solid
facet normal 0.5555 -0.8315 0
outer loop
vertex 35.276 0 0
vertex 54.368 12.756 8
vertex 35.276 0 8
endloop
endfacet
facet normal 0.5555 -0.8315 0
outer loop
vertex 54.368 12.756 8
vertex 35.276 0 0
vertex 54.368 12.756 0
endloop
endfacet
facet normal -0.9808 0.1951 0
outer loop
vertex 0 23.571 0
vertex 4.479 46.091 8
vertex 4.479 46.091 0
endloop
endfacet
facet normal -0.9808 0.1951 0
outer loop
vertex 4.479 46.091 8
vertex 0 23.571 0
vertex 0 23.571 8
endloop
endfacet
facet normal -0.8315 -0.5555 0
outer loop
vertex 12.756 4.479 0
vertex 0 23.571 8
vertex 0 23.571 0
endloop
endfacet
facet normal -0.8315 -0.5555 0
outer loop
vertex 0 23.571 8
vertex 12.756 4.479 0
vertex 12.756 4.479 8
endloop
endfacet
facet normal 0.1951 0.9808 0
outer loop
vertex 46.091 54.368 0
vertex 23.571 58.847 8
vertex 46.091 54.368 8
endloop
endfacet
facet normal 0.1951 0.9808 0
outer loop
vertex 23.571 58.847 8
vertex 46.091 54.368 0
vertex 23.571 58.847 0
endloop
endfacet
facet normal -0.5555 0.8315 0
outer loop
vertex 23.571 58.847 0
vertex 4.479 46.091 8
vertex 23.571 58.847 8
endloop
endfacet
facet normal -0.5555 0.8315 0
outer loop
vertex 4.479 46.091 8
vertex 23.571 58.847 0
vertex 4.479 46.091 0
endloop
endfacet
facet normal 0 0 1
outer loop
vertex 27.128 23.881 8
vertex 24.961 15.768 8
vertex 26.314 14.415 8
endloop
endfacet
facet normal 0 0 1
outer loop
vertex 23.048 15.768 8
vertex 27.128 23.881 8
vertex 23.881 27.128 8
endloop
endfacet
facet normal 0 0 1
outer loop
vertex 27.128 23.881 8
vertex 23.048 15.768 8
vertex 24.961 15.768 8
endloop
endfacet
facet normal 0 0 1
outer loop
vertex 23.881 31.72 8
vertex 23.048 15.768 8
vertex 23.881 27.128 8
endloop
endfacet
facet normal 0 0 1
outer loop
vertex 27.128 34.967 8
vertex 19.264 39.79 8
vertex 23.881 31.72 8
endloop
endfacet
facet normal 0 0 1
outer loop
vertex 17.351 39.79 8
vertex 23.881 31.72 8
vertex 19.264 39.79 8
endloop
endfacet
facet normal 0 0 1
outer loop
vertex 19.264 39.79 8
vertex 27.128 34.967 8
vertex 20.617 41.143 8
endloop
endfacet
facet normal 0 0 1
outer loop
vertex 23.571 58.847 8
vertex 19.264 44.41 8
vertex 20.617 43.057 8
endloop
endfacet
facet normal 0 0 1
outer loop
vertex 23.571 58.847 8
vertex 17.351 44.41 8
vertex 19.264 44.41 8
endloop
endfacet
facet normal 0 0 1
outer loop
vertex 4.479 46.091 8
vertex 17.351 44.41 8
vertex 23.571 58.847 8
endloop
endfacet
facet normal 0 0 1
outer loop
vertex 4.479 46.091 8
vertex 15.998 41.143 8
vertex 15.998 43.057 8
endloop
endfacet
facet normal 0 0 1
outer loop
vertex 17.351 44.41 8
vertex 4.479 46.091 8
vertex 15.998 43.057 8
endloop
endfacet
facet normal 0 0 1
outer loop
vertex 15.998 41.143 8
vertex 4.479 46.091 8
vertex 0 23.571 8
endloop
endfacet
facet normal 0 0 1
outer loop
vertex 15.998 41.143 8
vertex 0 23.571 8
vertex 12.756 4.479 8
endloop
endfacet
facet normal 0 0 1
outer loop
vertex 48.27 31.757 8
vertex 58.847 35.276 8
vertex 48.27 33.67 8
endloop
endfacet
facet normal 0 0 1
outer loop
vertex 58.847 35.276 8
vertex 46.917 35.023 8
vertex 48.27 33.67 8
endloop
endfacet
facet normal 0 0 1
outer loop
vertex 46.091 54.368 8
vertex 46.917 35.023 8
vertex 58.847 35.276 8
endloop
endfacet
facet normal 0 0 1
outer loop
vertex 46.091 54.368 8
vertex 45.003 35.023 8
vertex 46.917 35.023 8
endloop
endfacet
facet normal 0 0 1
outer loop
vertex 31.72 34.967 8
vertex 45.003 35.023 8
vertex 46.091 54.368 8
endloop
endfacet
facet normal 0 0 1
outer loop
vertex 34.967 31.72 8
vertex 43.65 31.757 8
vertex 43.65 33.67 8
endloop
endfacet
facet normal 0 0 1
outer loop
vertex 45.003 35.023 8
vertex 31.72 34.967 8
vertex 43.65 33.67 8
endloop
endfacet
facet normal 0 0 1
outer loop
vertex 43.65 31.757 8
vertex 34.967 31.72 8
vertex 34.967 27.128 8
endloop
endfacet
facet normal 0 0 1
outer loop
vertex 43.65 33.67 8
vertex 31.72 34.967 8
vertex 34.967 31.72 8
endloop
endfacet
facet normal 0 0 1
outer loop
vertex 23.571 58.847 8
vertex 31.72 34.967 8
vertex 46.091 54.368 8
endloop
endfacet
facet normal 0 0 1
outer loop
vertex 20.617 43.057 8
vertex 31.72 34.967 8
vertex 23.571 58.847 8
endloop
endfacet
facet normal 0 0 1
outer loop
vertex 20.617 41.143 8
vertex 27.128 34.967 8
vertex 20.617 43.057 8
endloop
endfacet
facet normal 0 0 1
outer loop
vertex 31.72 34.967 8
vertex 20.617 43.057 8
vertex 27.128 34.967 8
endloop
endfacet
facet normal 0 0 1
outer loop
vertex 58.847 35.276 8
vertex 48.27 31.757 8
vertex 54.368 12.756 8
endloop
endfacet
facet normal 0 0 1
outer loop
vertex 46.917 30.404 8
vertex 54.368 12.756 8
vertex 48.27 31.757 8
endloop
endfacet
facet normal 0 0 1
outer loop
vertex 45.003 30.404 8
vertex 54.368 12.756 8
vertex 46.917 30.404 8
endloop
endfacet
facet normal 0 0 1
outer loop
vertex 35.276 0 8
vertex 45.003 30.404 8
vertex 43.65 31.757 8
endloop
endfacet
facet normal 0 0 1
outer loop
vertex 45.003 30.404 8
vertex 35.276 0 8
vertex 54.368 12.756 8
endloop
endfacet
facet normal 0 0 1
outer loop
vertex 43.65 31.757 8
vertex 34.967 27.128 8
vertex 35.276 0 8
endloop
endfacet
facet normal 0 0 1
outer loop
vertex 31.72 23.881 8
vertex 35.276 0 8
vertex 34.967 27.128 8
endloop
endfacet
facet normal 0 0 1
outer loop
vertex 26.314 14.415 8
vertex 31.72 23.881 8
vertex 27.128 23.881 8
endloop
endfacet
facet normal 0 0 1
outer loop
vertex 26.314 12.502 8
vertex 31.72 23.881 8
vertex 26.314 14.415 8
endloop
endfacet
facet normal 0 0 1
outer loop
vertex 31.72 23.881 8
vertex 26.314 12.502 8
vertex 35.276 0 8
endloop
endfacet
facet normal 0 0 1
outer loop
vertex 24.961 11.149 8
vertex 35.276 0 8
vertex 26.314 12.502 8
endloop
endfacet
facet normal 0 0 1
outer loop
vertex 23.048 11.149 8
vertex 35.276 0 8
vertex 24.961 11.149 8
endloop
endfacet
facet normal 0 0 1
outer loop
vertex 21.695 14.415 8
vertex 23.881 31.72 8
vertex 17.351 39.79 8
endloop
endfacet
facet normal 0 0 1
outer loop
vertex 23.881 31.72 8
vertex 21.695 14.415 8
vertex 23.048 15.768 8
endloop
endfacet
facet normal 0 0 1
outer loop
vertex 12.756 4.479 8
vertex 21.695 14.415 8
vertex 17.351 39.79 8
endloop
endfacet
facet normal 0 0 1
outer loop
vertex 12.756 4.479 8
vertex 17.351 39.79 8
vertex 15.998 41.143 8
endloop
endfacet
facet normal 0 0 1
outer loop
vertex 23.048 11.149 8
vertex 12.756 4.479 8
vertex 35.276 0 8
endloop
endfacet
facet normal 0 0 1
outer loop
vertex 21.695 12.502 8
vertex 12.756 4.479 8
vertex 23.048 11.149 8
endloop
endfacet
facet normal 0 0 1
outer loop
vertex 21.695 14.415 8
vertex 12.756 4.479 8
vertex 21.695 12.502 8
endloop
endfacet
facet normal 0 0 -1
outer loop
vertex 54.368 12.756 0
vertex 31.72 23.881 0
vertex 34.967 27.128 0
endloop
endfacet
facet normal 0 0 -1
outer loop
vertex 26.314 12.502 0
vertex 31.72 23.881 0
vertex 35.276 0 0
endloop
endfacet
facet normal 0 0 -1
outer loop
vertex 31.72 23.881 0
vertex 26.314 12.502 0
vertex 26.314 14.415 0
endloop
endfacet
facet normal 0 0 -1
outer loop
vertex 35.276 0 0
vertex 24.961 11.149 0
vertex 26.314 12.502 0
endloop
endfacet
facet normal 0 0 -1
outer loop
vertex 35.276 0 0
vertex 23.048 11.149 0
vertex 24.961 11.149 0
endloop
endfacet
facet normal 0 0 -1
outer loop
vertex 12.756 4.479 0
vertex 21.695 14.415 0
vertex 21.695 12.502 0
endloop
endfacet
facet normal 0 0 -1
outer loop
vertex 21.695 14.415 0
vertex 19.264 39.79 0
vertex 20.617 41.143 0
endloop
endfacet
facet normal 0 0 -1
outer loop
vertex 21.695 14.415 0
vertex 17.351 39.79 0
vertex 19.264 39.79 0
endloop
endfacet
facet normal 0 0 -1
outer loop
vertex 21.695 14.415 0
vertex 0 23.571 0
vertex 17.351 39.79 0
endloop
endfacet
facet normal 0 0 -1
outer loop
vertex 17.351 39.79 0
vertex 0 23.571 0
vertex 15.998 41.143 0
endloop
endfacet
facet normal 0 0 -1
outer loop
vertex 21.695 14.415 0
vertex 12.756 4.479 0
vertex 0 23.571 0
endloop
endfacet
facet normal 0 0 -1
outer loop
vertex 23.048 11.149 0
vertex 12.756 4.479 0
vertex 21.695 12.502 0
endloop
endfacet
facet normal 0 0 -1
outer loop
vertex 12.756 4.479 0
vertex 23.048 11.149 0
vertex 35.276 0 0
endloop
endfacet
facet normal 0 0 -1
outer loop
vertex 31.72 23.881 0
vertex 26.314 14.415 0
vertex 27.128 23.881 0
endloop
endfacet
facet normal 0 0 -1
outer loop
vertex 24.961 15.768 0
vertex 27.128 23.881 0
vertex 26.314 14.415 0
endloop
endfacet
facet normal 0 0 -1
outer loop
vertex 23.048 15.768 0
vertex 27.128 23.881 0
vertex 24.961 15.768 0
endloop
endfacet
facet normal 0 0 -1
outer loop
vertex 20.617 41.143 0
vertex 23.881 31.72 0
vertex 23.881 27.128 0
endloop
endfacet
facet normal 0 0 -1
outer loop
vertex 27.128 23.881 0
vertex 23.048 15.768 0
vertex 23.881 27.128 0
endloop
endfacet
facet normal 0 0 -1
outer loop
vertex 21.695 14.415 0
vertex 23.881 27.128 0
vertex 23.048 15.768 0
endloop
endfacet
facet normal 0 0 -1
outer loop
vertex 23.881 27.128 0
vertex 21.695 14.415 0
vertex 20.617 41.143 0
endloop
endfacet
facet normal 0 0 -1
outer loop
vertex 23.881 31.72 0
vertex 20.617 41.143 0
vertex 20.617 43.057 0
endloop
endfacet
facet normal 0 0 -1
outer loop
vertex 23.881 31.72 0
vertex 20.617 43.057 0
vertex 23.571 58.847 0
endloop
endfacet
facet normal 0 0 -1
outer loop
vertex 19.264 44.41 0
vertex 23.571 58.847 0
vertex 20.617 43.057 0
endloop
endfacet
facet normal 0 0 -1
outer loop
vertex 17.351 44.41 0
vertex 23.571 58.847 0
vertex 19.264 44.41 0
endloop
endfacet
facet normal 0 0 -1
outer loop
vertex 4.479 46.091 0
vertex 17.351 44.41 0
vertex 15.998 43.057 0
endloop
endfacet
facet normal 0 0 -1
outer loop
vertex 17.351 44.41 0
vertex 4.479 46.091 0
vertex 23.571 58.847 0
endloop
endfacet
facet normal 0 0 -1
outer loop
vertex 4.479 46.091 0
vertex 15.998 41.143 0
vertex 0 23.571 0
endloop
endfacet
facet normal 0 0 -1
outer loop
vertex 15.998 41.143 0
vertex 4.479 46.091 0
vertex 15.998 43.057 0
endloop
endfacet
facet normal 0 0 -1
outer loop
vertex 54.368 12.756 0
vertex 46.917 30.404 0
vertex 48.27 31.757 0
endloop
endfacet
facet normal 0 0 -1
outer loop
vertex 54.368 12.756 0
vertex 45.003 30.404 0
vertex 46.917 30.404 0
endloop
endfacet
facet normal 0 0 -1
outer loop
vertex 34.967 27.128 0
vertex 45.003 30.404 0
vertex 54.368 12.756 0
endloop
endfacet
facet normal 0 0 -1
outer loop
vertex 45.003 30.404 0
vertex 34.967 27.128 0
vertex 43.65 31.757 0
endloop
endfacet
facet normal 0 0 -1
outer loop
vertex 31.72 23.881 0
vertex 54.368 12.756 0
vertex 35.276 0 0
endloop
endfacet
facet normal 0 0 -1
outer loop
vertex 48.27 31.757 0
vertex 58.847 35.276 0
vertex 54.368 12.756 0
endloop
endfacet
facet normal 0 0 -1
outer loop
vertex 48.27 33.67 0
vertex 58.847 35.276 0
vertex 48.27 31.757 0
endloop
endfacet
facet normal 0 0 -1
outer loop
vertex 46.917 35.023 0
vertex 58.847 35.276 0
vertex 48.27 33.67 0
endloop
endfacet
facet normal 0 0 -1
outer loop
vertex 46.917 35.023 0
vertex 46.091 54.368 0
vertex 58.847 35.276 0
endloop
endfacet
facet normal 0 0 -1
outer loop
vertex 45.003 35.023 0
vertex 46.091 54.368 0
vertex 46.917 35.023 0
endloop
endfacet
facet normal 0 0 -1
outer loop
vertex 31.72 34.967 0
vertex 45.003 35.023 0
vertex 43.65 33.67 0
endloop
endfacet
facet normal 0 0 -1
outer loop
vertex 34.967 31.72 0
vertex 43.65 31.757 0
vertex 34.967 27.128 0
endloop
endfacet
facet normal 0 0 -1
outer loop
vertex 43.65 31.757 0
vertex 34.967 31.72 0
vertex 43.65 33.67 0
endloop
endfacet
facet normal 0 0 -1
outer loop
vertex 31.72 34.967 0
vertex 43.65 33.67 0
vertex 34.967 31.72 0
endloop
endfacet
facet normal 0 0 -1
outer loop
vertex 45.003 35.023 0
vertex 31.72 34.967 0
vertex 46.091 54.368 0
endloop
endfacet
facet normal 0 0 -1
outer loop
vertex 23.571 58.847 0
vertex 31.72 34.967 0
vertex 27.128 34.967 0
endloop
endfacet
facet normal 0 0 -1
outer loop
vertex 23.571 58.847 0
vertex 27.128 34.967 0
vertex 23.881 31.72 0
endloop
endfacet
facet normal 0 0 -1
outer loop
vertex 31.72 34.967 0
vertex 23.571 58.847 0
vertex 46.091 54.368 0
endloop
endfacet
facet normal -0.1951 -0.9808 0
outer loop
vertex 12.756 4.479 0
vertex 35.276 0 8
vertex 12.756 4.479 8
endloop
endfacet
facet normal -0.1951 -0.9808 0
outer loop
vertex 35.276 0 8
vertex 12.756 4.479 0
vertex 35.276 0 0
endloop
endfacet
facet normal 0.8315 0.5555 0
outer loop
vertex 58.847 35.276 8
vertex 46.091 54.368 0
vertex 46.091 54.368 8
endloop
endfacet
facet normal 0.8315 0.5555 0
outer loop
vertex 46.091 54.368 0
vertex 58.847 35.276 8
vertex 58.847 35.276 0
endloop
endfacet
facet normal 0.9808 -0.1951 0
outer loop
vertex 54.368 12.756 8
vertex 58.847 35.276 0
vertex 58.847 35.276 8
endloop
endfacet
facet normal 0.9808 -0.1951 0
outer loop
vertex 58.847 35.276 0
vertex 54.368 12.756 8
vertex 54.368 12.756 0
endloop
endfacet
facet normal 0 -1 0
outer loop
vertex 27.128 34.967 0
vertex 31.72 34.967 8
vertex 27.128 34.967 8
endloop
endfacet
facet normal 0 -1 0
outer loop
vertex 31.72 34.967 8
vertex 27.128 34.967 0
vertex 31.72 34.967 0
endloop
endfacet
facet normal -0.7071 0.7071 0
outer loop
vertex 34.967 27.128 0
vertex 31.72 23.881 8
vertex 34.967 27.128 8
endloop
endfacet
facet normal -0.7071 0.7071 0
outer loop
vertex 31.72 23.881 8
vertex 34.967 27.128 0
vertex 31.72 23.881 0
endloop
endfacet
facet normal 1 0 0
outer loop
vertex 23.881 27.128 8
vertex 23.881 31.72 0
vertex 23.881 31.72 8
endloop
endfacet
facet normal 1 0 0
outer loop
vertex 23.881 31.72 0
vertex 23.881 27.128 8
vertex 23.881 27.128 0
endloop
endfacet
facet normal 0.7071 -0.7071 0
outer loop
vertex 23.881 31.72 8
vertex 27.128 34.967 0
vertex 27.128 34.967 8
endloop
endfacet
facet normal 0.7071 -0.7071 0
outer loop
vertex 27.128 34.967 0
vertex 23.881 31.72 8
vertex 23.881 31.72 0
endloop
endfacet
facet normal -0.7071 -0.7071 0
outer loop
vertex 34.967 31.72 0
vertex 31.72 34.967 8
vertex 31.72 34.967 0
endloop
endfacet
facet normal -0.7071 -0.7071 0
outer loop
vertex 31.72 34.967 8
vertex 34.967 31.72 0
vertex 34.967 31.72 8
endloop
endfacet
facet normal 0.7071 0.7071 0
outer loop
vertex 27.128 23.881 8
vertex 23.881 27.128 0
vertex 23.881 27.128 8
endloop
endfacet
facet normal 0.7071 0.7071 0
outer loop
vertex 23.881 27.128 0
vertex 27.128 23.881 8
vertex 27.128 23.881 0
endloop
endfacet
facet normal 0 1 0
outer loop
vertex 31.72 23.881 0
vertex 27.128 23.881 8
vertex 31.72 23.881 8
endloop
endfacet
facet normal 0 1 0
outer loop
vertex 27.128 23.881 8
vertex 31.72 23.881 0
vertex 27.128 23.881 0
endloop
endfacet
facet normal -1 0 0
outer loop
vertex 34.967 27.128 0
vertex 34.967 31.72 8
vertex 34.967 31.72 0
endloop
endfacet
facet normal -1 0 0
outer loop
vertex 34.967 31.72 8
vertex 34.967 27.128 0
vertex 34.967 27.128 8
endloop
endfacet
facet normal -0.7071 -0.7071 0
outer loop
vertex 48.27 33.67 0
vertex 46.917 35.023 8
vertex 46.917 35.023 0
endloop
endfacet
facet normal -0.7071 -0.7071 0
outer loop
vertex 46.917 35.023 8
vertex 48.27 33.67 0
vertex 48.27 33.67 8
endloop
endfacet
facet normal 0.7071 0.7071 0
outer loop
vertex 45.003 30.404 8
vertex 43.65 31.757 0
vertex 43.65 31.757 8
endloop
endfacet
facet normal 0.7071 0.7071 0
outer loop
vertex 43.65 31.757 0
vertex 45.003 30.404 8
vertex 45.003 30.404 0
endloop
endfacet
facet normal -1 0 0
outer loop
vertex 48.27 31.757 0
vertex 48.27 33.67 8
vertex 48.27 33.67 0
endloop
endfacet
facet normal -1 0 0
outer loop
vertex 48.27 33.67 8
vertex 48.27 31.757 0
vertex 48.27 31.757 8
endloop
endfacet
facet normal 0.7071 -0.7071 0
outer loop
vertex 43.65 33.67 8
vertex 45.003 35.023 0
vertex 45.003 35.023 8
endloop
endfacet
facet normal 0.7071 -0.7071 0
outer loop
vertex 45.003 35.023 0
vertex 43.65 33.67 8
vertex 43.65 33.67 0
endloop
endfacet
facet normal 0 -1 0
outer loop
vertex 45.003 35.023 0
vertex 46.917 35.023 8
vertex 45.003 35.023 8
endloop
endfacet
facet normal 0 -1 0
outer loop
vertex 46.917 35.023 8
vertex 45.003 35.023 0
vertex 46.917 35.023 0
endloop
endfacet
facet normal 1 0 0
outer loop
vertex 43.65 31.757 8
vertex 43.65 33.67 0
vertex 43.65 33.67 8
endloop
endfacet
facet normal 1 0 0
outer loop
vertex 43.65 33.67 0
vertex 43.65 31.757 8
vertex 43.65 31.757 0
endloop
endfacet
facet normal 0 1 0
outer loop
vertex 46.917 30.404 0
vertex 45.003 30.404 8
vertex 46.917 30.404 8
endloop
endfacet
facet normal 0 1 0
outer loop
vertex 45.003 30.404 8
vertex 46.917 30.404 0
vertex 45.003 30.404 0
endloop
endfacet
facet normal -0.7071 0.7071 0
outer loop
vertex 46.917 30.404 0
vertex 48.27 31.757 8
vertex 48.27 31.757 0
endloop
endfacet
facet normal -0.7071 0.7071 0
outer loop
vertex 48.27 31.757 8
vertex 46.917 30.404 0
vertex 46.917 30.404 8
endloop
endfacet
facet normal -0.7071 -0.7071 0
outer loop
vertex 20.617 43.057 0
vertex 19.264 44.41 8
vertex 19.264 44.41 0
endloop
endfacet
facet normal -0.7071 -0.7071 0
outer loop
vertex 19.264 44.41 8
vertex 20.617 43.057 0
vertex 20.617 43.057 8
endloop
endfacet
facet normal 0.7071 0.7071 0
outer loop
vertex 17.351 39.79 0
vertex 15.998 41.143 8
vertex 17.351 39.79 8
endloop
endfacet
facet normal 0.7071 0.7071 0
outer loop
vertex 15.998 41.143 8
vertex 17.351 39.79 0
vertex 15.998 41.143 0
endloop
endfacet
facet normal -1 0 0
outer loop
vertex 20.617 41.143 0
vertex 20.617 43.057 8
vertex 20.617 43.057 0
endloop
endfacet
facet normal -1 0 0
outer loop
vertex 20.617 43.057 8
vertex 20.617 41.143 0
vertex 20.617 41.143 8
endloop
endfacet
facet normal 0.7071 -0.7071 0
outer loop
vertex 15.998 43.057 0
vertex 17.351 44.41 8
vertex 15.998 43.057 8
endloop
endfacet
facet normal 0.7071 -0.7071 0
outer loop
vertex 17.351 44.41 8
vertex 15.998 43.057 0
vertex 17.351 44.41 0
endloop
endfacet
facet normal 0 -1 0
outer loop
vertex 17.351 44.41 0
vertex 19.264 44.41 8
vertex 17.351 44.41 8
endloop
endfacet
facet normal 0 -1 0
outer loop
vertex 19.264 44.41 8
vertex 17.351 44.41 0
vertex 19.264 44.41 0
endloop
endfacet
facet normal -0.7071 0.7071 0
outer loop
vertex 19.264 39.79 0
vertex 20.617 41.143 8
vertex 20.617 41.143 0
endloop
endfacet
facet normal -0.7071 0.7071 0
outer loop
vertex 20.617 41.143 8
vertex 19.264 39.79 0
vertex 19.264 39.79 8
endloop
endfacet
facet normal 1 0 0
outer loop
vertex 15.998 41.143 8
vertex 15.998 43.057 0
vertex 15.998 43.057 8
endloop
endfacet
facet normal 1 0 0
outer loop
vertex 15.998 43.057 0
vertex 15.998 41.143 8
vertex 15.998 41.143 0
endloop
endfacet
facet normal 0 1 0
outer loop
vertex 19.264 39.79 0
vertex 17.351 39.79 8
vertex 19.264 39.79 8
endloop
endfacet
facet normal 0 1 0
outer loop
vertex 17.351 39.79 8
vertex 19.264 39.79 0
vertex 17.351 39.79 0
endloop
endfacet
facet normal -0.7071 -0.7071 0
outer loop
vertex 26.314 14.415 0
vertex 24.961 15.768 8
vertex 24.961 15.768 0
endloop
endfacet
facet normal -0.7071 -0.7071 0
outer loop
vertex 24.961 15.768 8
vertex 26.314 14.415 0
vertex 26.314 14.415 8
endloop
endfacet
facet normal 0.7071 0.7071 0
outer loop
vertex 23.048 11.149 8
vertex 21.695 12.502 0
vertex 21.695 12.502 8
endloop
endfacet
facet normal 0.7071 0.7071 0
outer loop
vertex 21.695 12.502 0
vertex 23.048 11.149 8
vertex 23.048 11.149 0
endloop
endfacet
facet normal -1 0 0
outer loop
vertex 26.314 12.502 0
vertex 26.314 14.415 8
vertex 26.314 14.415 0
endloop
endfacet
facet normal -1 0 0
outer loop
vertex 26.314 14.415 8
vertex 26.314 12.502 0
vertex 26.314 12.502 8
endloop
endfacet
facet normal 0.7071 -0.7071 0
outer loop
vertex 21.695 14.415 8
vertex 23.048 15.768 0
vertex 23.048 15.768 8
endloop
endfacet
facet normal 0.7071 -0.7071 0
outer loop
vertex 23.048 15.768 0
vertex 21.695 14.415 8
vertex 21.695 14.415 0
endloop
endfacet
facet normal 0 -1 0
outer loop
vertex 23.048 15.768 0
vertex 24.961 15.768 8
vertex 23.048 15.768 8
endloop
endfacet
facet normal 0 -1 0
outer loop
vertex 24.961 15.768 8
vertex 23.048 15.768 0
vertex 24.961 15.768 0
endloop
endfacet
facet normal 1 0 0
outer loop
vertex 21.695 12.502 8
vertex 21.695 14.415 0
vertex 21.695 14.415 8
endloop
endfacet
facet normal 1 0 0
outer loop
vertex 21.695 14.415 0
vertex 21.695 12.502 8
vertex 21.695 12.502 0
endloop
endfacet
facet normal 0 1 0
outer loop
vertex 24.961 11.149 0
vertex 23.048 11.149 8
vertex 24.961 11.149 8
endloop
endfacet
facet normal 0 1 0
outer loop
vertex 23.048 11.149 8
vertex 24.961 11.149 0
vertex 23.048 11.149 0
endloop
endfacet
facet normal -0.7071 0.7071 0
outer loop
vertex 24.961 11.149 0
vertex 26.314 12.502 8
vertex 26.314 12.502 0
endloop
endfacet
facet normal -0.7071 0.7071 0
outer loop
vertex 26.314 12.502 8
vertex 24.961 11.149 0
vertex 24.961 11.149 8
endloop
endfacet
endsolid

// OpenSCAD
$fn = 32;

// ----------------------------------------------------------------------
// Polygon plate: 8-gon R30, 3 bolt windows
// ----------------------------------------------------------------------

// --- parameters (mm) ---
sides = 8;                // number of polygon sides
plate_r = 30;             // circumscribed radius of the polygon
bore_r = 6;               // centre bore radius
bolts = 3;                // number of bolt windows
ring_r = 16.86;           // bolt-circle radius
bolt_r = 2.5;             // bolt window radius
plate_t = 8;              // plate thickness, Z (extrusion height)

plate_d = 2 * plate_r;  // circumscribed diameter
bore_d = 2 * bore_r;  // centre bore diameter
bolt_d = 2 * bolt_r;  // bolt window diameter
ring_d = 2 * ring_r;  // bolt-circle diameter

profile = [[58.847, 35.276], [46.091, 54.368], [23.571, 58.847], [4.479, 46.091], [0, 23.571], [12.756, 4.479], [35.276, 0], [54.368, 12.756]];  // primary outline, 8 points, counter clockwise
void_1 = [[34.967, 31.72], [31.72, 34.967], [27.128, 34.967], [23.881, 31.72], [23.881, 27.128], [27.128, 23.881], [31.72, 23.881], [34.967, 27.128]];  // centre bore, 8 points
void_2 = [[48.27, 33.67], [46.917, 35.023], [45.003, 35.023], [43.65, 33.67], [43.65, 31.757], [45.003, 30.404], [46.917, 30.404], [48.27, 31.757]];  // bolt window 1, 8 points
void_3 = [[20.617, 43.057], [19.264, 44.41], [17.351, 44.41], [15.998, 43.057], [15.998, 41.143], [17.351, 39.79], [19.264, 39.79], [20.617, 41.143]];  // bolt window 2, 8 points
void_4 = [[26.314, 14.415], [24.961, 15.768], [23.048, 15.768], [21.695, 14.415], [21.695, 12.502], [23.048, 11.149], [24.961, 11.149], [26.314, 12.502]];  // bolt window 3, 8 points

// --- the one profile operation ---
difference() {
  linear_extrude(height = plate_t) polygon(points = profile);
  translate([0, 0, -1])
    linear_extrude(height = plate_t + 2) polygon(points = void_1);
  translate([0, 0, -1])
    linear_extrude(height = plate_t + 2) polygon(points = void_2);
  translate([0, 0, -1])
    linear_extrude(height = plate_t + 2) polygon(points = void_3);
  translate([0, 0, -1])
    linear_extrude(height = plate_t + 2) polygon(points = void_4);
}
